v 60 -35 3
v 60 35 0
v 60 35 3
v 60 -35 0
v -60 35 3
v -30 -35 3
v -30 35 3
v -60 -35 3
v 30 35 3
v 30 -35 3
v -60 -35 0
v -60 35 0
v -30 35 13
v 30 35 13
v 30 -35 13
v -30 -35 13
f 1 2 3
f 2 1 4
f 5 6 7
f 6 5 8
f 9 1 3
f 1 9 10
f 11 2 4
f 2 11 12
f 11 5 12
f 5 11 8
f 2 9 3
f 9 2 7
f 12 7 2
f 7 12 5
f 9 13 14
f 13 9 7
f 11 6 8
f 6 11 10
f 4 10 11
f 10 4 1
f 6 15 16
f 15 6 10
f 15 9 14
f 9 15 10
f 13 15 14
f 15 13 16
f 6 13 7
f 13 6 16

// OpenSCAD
// Mini horizontal gel-electrophoresis buffer tank
// Print orientation: base on XY plane, open top at z = 40

// ---------- Parameters ----------
outer_x   = 120;   // tank outer length (X)
outer_y   = 70;    // tank outer width (Y)
height    = 40;    // tank overall height (Z)
wall      = 3;     // wall thickness
floor     = 3;     // floor thickness under chambers

platform_len = 60;   // platform length in X
platform_top_z = 13; // top of platform (above inner floor)

hole_d     = 2;    // electrode hole diameter
hole_y     = 0;    // hole Y position
hole_z     = 30;   // hole Z position

eps        = 0.5;  // cutter overshoot
$fn        = 64;

// ---------- Derived ----------
inner_h = height - wall;              // 37 mm chamber height
overl   = min(wall, floor);           // walls merge into floor

// ---------- Model ----------
difference() {
    union() {
        // Base slab (floor + end walls, includes overlap)
        translate([-outer_x/2, -outer_y/2, 0])
            cube([outer_x, outer_y, overl]);

        // Raised platform
        translate([-platform_len/2, -outer_y/2, floor])
            cube([platform_len, outer_y, platform_top_z - floor]);
    }

    // Buffer chambers (open at top, above platform)
    translate([-outer_x/2, -outer_y/2, platform_top_z])
        cube([outer_x, outer_y, height - platform_top_z]);

    // Electrode holes through end walls
    for (sx = [-1, 1])
        translate([sx > 0 ? outer_x/2 - eps : -outer_x/2, hole_y, hole_z])
            rotate([0, 90, 0])
                cylinder(d = hole_d, h = outer_y + 2*eps);
}
